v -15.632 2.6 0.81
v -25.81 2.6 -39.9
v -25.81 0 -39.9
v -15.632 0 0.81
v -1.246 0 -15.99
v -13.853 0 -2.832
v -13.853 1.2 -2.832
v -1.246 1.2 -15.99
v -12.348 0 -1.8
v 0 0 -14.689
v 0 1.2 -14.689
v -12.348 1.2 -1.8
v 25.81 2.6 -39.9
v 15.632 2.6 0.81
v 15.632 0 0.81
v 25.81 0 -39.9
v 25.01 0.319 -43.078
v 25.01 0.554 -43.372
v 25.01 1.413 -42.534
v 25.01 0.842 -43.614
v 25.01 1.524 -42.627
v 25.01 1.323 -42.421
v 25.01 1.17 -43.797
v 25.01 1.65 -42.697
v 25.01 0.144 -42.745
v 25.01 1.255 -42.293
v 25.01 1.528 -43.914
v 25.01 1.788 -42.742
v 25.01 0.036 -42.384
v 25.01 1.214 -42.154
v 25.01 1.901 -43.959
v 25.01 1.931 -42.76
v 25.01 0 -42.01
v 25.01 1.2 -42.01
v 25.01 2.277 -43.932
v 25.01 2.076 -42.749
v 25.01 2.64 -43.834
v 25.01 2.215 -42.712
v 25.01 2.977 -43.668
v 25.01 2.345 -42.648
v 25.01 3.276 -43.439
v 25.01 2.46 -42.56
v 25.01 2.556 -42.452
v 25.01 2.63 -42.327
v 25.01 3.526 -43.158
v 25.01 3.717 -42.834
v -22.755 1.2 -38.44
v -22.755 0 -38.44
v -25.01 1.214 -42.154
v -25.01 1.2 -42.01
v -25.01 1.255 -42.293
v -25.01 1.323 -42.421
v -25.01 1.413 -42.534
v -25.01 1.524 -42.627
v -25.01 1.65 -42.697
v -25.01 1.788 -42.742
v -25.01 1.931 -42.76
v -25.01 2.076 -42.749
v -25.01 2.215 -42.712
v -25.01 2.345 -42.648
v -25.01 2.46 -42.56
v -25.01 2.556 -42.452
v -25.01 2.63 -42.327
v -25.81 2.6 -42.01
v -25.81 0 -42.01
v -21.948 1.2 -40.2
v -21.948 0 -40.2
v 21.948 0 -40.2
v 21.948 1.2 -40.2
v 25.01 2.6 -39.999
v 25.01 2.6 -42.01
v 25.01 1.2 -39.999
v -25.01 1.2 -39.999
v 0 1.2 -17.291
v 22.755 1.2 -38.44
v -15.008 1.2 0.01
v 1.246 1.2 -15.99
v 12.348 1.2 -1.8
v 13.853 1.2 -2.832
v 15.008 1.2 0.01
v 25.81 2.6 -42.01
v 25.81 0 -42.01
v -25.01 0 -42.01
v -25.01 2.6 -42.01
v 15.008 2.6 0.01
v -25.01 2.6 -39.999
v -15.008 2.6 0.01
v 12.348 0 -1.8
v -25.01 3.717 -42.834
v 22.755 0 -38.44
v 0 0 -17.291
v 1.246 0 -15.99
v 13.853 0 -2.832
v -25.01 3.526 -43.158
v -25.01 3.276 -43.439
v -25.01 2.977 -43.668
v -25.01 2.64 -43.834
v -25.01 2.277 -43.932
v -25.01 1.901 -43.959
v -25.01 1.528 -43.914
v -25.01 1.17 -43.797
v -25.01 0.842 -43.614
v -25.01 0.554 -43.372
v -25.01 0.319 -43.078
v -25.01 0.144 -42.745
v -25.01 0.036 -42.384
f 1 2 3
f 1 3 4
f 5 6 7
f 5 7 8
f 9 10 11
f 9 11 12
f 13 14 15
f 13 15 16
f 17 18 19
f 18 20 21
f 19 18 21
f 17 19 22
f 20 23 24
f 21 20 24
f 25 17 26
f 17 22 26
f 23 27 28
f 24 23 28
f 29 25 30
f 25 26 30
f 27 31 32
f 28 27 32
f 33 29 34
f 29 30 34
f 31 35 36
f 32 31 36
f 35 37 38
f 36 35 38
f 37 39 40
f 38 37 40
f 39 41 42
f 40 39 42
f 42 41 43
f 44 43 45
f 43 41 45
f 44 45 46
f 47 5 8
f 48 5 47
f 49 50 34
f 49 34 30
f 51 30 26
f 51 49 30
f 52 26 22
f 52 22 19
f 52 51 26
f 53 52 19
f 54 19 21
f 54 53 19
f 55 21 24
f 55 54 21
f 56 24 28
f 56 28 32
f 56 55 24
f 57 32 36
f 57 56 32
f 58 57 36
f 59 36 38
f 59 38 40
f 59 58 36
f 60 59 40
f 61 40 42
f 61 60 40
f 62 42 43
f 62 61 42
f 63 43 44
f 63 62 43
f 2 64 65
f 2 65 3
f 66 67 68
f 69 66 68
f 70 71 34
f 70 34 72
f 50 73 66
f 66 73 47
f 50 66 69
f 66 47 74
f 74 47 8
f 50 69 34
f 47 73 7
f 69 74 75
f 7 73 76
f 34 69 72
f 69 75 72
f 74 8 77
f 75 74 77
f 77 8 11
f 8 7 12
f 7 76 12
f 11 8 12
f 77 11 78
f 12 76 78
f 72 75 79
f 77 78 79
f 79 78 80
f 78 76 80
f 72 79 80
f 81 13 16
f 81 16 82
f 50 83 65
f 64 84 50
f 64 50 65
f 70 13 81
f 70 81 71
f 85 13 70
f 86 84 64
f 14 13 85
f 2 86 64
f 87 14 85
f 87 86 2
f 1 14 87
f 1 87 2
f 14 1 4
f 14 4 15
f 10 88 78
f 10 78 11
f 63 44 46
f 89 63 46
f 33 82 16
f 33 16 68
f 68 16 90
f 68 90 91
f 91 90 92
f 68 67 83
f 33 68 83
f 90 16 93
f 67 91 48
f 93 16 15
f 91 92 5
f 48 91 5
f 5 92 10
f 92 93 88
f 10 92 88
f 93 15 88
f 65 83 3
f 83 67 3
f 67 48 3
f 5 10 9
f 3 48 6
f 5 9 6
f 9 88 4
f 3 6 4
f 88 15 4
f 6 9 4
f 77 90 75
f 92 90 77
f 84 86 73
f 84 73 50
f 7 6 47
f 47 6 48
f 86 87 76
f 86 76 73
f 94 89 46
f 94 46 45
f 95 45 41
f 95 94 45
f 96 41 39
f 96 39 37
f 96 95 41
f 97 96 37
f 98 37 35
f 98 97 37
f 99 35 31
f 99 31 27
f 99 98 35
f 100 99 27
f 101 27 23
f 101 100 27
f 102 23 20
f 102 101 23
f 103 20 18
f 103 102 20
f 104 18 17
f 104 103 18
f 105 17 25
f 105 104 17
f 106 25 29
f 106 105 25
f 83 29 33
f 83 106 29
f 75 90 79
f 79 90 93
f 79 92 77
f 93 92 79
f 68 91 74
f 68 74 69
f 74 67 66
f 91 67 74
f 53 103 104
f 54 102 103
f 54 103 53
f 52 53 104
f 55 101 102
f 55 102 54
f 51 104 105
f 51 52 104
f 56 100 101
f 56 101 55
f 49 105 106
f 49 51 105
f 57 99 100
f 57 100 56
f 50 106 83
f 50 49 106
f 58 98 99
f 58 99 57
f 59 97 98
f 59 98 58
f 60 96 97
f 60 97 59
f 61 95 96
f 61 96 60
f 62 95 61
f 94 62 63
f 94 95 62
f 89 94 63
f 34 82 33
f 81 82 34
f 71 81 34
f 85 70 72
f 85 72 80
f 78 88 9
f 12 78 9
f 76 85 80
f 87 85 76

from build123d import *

# Parameters (mm, degrees)
EXTRUDE_THIN1_DEPTH = 1.2
EXTRUDE_THIN2_DEPTH = 1.2
BOSS_EXTRUDE1_DEPTH = 50.02
EXTRUDE_THIN5_START = -2.6
EXTRUDE_THIN5_DEPTH = 2.6


# Read off the part's stored shape, not the designer's step: Extrude-Thin1
with BuildPart() as part:
    # Extrude-Thin1 outline → Extrude-Thin1 (new body)
    with BuildSketch(Plane(origin=(0, 0, 0), x_dir=(1, 0, 0), z_dir=(0, 1, 0))):
        Polygon((-25.01, 39.998768944), (-15.007807764, -0.01), (15.007807764, -0.01), (25.01, 39.998768944), (25.01, 42.01), (-25.01, 42.01), align=None)
        Polygon((13.594602468, 1.8), (-13.594602468, 1.8), (-23.194602468, 40.2), (23.194602468, 40.2), align=None, mode=Mode.SUBTRACT)
    extrude(amount=EXTRUDE_THIN1_DEPTH)

    # Sketch3 → Extrude-Thin2 (add)
    with BuildSketch(Plane.XZ):
        Polygon((23.844483111, -39.577380413), (-12.944721826, -1.177380413), (-14.244483111, -2.422619587), (22.544721826, -40.822619587), align=None)
        Polygon((-22.544721826, -40.822619587), (14.244483111, -2.422619587), (12.944721826, -1.177380413), (-23.844483111, -39.577380413), align=None)
    extrude(amount=-EXTRUDE_THIN2_DEPTH)

    # Sketch4 → Boss-Extrude1 (add)
    with BuildSketch(Plane.ZY.offset(25.01)):
        with BuildLine():
            Line((-42.326963696, 2.62973084), (-42.83410561, 3.717300185))
            ThreePointArc((-42.83410561, 3.717300185), (-43.913777214, 1.527942753), (-42.01, 0))
            Line((-42.01, 0), (-42.01, 1.2))
            ThreePointArc((-42.01, 1.2), (-42.742222005, 1.78767029), (-42.326963696, 2.62973084))
        make_face()
    extrude(amount=-BOSS_EXTRUDE1_DEPTH)

    # Sketch5 → Extrude-Thin5 (add)
    with BuildSketch(Plane.XZ.offset(EXTRUDE_THIN5_START)):
        Polygon((25.01, -42.01), (25.01, -39.998768944), (15.007807764, 0.01), (-15.007807764, 0.01), (-25.01, -39.998768944), (-25.01, -42.01), (-25.81, -42.01), (-25.81, -39.900284443), (-15.632428889, 0.81), (15.632428889, 0.81), (25.81, -39.900284443), (25.81, -42.01), align=None)
    extrude(amount=EXTRUDE_THIN5_DEPTH)


solid = part.part
